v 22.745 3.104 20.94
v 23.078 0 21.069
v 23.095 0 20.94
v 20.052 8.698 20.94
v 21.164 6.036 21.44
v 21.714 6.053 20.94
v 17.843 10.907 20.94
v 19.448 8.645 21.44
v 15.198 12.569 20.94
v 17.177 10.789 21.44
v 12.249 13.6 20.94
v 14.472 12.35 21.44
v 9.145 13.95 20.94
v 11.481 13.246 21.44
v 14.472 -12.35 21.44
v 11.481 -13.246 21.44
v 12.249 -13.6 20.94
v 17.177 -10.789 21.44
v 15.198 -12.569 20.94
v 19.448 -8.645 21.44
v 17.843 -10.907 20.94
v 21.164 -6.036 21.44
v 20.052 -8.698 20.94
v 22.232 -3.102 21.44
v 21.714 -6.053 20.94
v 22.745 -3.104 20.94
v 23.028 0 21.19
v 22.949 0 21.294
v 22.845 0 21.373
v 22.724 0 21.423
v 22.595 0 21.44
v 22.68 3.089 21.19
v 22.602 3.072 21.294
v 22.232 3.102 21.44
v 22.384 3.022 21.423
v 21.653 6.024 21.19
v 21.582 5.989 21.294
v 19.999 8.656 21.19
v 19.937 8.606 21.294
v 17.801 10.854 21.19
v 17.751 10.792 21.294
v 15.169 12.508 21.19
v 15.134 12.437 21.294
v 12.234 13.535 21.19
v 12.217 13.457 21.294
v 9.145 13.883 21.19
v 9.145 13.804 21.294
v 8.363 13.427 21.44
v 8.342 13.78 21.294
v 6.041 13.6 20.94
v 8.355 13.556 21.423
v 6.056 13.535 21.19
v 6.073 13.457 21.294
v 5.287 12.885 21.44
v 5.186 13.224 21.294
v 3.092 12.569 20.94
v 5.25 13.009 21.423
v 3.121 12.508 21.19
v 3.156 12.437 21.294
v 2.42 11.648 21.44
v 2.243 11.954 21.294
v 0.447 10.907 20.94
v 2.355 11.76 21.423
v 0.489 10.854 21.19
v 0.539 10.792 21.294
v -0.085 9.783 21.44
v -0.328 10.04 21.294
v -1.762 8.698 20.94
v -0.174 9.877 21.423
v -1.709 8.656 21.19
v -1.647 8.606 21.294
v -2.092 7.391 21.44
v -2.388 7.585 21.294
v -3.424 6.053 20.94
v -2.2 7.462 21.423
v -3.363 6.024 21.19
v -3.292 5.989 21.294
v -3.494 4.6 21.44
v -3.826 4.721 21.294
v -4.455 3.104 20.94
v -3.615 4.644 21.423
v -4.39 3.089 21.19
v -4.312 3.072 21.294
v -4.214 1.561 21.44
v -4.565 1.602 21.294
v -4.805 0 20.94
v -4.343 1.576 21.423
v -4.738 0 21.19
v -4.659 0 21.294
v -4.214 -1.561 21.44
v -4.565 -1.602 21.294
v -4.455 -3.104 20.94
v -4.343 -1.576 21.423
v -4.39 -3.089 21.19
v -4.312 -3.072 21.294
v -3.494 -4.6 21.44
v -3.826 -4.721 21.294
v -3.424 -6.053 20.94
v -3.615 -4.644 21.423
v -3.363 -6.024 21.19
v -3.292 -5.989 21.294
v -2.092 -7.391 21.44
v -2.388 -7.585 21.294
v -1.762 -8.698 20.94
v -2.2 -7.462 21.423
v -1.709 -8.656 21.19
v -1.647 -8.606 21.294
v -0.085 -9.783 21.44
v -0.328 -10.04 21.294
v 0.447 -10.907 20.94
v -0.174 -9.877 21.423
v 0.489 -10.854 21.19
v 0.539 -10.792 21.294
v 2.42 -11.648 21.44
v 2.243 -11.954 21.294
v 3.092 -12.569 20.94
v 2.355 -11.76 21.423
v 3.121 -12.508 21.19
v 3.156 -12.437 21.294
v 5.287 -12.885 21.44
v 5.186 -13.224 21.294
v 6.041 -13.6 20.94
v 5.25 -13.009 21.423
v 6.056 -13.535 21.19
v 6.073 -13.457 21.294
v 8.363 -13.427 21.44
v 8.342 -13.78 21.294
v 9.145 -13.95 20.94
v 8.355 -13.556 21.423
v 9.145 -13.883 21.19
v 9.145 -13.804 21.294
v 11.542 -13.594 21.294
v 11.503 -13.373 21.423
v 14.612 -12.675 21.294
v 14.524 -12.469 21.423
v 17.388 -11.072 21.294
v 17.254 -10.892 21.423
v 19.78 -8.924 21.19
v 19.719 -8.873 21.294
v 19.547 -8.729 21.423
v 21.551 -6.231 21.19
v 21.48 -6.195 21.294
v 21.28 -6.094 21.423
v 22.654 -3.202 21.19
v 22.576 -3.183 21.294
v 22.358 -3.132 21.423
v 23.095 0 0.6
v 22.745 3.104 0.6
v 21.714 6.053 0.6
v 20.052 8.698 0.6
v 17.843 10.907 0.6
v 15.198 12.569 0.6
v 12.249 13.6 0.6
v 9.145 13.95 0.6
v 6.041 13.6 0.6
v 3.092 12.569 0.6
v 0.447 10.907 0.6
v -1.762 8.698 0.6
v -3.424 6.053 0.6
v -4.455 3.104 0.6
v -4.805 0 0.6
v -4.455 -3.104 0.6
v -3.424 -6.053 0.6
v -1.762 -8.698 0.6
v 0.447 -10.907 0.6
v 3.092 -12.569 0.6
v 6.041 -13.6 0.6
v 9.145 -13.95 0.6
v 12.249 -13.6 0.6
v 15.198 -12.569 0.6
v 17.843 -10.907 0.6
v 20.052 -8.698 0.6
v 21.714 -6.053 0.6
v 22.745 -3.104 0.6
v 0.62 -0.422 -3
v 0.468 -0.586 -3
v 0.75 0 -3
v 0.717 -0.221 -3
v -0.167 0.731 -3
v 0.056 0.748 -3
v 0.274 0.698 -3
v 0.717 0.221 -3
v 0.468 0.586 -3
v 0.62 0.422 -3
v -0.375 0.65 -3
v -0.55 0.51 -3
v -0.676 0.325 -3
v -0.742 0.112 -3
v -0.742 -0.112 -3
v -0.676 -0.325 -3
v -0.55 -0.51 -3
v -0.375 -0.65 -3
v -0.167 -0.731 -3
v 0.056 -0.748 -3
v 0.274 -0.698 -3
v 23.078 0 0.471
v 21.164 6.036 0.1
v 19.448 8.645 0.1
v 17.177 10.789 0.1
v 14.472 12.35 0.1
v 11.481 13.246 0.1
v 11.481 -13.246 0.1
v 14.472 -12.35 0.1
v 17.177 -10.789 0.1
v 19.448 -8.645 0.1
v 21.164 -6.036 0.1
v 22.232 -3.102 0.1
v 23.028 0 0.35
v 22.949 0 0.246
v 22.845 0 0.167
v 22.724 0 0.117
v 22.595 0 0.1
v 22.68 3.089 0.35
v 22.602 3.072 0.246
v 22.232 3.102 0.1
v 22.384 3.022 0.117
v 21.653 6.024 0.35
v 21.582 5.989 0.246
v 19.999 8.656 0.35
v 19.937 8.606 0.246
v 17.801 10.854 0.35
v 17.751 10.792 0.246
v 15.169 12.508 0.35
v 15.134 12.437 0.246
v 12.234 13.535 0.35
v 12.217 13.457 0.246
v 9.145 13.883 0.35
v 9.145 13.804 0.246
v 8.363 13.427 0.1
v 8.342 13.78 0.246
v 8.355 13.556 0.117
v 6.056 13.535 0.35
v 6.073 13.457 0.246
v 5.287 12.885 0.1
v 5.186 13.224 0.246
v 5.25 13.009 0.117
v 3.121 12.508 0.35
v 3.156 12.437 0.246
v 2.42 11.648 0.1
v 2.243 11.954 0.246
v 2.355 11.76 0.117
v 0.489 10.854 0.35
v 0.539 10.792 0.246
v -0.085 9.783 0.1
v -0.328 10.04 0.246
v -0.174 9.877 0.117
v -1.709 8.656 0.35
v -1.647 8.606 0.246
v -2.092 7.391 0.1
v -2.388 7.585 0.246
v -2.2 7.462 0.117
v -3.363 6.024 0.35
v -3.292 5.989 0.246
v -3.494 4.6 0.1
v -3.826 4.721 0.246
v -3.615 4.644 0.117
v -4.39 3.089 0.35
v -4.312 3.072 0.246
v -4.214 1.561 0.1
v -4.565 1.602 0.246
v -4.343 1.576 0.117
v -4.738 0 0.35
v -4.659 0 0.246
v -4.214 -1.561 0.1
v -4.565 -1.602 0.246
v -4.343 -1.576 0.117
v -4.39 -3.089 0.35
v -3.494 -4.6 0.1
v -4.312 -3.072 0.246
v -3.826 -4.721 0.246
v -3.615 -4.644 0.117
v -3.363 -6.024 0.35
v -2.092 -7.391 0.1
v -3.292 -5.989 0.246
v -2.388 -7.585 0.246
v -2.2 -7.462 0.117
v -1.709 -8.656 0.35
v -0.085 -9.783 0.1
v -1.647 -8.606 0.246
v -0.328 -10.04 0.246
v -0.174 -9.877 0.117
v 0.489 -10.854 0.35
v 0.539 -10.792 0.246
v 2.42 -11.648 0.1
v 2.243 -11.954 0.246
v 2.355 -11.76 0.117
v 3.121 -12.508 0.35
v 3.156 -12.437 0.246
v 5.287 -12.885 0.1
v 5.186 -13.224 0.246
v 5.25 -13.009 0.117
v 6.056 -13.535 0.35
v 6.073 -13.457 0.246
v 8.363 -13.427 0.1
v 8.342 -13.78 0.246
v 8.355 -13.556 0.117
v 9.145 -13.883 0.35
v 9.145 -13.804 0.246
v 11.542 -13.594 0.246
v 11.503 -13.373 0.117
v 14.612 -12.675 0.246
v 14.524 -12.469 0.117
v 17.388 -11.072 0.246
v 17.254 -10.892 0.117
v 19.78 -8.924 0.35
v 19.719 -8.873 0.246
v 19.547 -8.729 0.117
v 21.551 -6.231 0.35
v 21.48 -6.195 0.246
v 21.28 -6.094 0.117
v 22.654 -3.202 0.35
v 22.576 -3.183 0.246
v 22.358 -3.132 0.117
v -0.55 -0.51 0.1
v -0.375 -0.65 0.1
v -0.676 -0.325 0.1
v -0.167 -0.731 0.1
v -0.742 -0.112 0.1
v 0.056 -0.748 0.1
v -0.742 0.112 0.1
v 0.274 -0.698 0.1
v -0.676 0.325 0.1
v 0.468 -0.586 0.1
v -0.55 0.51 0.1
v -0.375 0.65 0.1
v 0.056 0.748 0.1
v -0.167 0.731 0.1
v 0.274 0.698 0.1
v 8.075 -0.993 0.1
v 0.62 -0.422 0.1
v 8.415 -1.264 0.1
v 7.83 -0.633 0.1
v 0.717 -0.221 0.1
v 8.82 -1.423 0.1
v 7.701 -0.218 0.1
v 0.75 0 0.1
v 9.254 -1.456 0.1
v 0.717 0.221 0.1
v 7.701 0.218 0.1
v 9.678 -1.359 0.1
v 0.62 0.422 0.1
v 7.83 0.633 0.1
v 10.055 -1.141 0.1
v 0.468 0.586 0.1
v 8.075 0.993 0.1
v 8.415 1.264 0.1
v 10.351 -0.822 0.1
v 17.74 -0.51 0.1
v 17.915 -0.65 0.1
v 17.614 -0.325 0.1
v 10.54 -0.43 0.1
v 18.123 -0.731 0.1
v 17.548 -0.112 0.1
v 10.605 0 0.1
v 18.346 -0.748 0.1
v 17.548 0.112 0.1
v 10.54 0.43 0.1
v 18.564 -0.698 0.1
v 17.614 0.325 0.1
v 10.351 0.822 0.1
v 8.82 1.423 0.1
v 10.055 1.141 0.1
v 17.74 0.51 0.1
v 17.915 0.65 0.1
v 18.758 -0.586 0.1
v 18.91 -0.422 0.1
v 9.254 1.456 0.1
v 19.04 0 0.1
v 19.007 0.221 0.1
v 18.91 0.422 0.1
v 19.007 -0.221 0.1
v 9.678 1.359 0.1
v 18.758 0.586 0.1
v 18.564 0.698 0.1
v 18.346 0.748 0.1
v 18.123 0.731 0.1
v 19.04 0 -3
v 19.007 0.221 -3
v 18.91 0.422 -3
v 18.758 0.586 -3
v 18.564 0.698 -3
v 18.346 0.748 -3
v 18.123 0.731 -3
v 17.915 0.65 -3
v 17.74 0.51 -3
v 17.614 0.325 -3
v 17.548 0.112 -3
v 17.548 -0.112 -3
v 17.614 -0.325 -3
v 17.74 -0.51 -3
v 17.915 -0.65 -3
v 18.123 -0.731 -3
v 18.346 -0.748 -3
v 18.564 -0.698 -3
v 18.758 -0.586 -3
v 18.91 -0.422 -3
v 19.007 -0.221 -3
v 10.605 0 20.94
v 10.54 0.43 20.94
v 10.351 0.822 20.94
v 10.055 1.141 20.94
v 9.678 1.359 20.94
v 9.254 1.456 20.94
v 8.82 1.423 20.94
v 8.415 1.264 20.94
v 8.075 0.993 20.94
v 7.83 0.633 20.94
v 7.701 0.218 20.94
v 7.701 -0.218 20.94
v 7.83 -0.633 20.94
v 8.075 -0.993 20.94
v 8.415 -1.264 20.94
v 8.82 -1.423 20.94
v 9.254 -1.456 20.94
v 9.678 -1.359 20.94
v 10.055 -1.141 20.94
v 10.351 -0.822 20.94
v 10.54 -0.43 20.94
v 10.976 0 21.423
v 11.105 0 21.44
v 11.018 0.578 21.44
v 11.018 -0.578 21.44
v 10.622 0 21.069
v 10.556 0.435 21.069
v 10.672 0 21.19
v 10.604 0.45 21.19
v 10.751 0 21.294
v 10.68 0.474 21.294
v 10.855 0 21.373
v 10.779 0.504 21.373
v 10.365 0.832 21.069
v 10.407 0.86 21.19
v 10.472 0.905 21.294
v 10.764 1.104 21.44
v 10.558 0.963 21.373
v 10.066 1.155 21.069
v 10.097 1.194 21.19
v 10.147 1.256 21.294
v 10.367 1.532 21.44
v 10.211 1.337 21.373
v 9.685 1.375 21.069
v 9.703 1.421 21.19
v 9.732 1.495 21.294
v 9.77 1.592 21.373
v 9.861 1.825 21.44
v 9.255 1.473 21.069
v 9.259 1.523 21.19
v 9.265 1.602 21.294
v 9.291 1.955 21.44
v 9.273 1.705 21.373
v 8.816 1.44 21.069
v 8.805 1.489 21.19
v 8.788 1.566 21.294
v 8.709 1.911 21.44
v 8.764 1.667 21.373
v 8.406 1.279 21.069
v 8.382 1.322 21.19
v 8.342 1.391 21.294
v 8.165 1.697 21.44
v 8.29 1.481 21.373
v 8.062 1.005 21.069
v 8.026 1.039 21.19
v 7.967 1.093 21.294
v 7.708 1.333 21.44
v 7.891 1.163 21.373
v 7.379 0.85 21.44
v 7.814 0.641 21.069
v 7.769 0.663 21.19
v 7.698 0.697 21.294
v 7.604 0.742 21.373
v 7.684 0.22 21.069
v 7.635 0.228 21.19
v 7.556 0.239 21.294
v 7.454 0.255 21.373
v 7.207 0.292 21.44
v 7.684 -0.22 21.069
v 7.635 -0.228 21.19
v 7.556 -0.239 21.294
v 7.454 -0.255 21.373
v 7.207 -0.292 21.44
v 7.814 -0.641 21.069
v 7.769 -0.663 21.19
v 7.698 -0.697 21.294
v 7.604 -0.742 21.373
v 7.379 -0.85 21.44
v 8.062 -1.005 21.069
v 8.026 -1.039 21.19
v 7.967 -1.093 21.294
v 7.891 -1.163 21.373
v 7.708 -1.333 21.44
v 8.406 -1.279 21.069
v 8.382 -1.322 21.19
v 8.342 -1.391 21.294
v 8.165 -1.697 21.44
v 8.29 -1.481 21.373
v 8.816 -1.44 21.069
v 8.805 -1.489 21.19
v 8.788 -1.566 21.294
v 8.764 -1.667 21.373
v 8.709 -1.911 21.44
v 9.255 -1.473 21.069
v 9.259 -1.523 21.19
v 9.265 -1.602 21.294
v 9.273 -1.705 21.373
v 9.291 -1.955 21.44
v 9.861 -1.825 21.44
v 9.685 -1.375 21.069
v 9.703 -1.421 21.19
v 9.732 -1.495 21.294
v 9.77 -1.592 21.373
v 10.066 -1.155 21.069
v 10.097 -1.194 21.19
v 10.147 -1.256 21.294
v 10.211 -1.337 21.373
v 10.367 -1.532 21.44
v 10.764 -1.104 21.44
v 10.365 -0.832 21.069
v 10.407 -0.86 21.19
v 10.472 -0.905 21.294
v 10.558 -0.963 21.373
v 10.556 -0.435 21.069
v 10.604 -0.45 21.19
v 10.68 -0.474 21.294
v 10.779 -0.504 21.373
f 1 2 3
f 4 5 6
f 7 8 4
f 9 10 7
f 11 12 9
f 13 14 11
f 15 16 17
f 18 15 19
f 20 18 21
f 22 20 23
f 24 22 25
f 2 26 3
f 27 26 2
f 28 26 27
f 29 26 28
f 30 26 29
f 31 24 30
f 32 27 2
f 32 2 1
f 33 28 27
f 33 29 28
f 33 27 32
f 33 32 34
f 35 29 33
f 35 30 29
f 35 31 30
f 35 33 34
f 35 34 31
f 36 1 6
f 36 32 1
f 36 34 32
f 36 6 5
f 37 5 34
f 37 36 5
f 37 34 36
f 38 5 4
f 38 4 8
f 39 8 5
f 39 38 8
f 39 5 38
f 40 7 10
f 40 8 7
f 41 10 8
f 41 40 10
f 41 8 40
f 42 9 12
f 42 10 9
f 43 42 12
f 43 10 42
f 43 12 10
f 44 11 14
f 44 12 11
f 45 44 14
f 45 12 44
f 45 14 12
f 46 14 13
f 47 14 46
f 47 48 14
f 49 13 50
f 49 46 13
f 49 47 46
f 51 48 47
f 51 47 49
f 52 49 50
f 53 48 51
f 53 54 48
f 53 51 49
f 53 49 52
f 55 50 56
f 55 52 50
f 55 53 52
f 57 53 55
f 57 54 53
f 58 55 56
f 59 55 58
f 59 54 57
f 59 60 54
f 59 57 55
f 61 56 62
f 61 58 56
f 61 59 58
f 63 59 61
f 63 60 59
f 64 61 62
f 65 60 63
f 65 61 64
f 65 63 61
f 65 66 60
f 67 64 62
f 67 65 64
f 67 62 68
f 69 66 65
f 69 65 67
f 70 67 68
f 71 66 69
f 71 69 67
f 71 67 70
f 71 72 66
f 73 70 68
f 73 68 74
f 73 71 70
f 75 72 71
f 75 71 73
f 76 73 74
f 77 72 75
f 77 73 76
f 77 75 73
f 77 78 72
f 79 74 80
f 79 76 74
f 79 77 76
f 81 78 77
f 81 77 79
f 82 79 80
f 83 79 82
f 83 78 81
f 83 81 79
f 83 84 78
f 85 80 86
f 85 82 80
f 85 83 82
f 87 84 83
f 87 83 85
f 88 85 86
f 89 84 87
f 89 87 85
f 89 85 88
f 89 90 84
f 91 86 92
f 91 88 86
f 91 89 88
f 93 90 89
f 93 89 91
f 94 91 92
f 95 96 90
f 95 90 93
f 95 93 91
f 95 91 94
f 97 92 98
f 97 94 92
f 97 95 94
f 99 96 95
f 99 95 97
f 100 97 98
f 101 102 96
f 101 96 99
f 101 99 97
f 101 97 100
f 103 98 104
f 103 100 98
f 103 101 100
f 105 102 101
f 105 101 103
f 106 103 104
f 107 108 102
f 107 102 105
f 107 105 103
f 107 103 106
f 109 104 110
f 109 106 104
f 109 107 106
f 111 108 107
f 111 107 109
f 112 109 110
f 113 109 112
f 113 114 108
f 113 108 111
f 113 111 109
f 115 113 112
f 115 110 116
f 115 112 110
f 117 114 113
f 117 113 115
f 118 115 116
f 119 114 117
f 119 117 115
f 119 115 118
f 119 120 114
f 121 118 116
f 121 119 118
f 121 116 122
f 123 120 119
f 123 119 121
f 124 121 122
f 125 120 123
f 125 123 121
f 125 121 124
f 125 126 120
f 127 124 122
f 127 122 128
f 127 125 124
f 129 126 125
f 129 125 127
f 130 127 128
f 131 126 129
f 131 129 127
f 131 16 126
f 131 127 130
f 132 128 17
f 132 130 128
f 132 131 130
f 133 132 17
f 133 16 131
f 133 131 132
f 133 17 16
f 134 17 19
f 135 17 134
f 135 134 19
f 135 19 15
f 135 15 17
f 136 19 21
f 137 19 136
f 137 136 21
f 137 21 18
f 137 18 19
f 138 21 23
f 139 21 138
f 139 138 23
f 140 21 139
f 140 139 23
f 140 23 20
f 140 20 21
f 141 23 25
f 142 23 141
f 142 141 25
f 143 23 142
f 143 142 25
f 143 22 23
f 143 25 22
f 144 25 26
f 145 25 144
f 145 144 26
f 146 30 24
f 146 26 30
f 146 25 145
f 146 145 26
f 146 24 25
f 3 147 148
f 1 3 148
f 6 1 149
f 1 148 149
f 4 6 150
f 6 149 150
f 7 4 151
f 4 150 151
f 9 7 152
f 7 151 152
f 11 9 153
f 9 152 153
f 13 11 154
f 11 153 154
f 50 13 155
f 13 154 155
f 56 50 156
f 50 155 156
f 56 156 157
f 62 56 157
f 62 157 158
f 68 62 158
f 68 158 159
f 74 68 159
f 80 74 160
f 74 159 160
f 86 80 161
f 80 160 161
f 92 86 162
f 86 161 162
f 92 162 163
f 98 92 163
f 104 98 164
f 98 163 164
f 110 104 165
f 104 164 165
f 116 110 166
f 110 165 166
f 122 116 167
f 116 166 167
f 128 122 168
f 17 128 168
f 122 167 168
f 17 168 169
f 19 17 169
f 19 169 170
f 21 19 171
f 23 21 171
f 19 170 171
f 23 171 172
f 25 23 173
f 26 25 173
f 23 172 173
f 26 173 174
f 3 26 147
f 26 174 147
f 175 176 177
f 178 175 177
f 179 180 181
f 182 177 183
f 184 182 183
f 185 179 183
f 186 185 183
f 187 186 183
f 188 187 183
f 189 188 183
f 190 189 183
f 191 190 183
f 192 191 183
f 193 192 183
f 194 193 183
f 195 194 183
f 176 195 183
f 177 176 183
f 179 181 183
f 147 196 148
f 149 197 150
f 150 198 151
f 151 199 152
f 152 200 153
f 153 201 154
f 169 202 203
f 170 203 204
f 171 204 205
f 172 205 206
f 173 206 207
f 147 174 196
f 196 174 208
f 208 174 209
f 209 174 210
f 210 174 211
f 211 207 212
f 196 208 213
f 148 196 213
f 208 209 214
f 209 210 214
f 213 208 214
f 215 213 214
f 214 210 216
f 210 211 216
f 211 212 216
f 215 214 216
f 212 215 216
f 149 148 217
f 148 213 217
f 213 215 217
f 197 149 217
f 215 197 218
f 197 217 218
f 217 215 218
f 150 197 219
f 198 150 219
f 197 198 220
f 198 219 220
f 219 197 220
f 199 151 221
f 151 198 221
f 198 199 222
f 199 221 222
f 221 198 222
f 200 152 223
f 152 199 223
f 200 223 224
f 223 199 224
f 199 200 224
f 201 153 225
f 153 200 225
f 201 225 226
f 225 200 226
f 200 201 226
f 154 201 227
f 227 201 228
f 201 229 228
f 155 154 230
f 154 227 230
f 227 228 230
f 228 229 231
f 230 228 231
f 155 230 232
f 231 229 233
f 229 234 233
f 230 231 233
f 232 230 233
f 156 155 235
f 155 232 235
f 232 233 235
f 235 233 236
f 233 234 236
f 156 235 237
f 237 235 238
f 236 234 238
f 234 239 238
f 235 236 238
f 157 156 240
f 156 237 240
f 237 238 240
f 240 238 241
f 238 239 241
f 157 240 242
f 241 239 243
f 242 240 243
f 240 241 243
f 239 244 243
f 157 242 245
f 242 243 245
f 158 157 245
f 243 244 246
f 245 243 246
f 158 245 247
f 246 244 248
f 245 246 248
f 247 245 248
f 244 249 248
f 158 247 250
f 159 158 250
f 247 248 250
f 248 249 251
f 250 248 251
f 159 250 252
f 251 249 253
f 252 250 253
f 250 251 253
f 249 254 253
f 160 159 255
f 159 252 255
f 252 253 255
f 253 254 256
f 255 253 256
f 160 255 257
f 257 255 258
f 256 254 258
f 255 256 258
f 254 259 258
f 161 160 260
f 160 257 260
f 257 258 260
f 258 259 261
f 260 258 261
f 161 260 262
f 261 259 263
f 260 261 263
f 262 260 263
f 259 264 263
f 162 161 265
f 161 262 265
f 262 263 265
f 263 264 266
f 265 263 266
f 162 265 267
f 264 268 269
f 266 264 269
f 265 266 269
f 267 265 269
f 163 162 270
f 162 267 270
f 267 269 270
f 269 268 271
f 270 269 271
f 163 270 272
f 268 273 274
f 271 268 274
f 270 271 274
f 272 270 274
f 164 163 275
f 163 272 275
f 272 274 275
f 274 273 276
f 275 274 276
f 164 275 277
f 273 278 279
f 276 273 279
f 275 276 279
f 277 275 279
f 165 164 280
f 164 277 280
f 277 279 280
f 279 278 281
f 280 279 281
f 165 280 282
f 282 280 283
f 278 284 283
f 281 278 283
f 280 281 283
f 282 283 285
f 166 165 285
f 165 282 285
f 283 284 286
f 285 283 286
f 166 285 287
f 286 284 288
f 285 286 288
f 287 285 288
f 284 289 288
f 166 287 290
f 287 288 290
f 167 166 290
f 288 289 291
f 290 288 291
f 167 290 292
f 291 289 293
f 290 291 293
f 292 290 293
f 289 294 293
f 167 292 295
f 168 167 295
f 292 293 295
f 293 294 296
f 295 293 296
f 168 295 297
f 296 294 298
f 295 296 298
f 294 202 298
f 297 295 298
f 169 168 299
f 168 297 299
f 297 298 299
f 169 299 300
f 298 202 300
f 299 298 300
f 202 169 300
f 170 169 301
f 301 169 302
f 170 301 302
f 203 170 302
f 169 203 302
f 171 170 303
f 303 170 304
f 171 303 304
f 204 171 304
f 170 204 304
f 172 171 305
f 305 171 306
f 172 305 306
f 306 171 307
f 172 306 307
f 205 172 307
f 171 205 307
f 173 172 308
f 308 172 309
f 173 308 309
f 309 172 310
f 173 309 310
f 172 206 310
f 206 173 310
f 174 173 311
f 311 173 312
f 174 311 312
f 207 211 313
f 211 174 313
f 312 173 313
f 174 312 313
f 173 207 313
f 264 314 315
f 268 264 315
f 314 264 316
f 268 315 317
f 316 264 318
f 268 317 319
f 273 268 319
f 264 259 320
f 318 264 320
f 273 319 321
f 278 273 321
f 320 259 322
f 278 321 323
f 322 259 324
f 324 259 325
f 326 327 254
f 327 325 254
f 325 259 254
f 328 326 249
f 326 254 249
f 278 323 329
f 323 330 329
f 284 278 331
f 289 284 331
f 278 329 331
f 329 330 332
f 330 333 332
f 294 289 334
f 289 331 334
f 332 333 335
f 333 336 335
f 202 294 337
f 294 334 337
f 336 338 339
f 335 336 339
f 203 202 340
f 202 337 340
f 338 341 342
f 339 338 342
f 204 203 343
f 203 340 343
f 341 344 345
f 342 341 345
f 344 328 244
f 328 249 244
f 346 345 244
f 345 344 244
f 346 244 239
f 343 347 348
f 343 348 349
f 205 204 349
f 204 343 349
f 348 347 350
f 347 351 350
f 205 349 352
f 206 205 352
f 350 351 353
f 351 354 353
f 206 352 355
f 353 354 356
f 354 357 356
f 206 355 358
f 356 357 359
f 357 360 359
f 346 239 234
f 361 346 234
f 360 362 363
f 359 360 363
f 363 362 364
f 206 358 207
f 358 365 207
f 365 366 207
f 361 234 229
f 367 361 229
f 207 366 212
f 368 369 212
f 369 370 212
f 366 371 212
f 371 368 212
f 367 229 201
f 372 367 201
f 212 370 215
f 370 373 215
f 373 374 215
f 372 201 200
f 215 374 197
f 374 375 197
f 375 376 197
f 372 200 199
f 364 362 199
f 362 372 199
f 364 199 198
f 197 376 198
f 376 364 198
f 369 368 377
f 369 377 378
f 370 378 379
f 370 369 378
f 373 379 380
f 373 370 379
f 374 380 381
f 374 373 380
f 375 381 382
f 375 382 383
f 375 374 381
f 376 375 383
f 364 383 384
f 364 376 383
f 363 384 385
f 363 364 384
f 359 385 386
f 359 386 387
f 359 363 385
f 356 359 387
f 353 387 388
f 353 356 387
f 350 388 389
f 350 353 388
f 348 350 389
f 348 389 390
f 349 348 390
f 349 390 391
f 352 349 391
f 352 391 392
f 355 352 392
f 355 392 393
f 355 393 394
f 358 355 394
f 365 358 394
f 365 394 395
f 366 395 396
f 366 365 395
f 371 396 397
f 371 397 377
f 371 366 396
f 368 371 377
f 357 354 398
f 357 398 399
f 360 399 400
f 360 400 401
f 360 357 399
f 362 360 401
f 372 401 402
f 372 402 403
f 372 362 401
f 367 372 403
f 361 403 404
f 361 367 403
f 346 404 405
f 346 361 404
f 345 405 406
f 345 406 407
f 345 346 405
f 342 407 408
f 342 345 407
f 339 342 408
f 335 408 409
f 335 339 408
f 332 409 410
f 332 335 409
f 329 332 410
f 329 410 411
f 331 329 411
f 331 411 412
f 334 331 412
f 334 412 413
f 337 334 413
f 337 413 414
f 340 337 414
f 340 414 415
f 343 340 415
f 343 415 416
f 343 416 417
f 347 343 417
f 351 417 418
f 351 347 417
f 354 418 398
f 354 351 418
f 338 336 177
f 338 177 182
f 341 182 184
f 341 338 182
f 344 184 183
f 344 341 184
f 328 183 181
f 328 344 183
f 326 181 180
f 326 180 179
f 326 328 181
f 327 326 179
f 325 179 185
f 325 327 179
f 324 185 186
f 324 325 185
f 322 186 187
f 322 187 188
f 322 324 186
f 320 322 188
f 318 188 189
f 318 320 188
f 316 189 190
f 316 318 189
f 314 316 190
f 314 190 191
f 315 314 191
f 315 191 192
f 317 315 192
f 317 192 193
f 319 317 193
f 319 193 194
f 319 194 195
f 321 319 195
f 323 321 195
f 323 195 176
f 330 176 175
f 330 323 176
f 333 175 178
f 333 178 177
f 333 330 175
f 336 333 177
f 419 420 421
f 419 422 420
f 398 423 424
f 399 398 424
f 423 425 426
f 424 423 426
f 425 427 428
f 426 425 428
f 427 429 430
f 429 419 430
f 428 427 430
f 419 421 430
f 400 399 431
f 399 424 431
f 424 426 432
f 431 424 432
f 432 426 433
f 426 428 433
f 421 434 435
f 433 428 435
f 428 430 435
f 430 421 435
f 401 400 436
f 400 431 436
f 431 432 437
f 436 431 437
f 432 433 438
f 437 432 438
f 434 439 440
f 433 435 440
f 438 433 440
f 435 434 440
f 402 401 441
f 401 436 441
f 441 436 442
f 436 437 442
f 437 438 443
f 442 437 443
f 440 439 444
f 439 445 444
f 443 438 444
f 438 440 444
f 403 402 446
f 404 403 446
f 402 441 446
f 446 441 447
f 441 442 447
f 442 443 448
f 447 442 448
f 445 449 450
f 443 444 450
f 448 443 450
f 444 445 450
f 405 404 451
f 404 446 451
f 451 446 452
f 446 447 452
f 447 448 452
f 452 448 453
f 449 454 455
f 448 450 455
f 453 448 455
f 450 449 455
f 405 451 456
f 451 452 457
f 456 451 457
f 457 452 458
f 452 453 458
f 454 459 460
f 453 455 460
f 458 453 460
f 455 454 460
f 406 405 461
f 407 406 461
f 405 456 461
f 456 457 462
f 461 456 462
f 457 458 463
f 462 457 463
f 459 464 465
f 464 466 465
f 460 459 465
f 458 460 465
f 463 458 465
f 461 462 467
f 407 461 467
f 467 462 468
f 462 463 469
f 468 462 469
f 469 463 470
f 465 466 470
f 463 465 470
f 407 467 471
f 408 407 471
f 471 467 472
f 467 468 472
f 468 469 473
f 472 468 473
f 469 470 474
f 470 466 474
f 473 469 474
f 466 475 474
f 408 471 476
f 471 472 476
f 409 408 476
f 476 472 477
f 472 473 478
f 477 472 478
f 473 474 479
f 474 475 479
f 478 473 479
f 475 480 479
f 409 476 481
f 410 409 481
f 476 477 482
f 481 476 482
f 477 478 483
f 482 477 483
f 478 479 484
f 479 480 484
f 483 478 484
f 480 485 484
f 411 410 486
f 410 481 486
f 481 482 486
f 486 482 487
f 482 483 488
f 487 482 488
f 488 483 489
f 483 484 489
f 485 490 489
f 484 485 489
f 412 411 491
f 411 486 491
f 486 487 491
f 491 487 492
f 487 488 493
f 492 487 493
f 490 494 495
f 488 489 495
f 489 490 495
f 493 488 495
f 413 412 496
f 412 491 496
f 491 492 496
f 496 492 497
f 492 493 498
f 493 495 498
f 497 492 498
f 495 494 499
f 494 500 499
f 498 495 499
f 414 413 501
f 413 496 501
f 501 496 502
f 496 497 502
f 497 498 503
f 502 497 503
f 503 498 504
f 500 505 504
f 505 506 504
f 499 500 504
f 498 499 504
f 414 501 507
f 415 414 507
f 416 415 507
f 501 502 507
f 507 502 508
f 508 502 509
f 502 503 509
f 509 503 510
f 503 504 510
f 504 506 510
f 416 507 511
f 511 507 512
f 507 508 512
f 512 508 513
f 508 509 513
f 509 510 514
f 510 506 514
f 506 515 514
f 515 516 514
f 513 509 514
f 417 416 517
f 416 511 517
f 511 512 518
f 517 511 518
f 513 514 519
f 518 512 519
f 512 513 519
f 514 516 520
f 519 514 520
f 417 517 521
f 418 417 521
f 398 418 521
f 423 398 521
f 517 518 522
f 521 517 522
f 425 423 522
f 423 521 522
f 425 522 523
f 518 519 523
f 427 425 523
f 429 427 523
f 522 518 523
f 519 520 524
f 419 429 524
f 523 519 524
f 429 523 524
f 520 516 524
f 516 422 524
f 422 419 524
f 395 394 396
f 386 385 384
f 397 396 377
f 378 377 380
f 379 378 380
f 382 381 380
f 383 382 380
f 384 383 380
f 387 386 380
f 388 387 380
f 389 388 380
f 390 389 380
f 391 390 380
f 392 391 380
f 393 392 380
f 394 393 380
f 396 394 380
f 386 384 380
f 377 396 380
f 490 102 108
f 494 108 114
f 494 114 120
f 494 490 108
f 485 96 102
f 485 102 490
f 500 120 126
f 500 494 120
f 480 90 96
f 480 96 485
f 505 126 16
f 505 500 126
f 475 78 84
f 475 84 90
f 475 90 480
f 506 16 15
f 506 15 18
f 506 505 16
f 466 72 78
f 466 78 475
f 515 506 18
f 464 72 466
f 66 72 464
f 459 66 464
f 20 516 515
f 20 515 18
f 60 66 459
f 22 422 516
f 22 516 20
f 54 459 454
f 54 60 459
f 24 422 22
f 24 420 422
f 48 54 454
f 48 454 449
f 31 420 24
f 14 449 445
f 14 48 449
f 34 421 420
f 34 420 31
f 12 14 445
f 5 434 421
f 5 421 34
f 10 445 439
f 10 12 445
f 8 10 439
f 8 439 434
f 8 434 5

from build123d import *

# Parameters (mm, degrees)
SKETCH001_R       = 0.75
PAD001_DEPTH      = 10.67
PAD001_DEPTH_BACK = 3.5
SKETCH_R          = 13.95
SKETCH_R_2        = 1.46
PAD_DEPTH         = 21.34
FILLET_R          = 0.5


with BuildPart() as pad001:
    # Sketch001 → Pad001 (new body, two sides)
    with BuildSketch(Plane.XY.offset(0.5)) as pad001_sk:
        Circle(SKETCH001_R)
        with Locations((18.29, 0)):
            Circle(SKETCH001_R)
    extrude(amount=PAD001_DEPTH)
    extrude(pad001_sk.sketch, amount=-PAD001_DEPTH_BACK)


with BuildPart() as fillet_mp_cp:
    # Sketch → Pad (new body)
    with BuildSketch(Plane.XY.offset(0.1)):
        with Locations((9.145, 0)):
            Circle(SKETCH_R)
        with Locations((9.145, 0)):
            Circle(SKETCH_R_2, mode=Mode.SUBTRACT)
    extrude(amount=PAD_DEPTH)

    # Fillet
    fillet_edges = [fillet_mp_cp.edges().sort_by_distance(p)[0] for p in [
        (7.685, 0, 21.44),
        (-4.805, 0, 21.44),
        (-4.805, 0, 0.1),
    ]]
    fillet(fillet_edges, radius=FILLET_R)

    # Fillet_mp_cp: union Pad001
    add(pad001.part)


solid = fillet_mp_cp.part
